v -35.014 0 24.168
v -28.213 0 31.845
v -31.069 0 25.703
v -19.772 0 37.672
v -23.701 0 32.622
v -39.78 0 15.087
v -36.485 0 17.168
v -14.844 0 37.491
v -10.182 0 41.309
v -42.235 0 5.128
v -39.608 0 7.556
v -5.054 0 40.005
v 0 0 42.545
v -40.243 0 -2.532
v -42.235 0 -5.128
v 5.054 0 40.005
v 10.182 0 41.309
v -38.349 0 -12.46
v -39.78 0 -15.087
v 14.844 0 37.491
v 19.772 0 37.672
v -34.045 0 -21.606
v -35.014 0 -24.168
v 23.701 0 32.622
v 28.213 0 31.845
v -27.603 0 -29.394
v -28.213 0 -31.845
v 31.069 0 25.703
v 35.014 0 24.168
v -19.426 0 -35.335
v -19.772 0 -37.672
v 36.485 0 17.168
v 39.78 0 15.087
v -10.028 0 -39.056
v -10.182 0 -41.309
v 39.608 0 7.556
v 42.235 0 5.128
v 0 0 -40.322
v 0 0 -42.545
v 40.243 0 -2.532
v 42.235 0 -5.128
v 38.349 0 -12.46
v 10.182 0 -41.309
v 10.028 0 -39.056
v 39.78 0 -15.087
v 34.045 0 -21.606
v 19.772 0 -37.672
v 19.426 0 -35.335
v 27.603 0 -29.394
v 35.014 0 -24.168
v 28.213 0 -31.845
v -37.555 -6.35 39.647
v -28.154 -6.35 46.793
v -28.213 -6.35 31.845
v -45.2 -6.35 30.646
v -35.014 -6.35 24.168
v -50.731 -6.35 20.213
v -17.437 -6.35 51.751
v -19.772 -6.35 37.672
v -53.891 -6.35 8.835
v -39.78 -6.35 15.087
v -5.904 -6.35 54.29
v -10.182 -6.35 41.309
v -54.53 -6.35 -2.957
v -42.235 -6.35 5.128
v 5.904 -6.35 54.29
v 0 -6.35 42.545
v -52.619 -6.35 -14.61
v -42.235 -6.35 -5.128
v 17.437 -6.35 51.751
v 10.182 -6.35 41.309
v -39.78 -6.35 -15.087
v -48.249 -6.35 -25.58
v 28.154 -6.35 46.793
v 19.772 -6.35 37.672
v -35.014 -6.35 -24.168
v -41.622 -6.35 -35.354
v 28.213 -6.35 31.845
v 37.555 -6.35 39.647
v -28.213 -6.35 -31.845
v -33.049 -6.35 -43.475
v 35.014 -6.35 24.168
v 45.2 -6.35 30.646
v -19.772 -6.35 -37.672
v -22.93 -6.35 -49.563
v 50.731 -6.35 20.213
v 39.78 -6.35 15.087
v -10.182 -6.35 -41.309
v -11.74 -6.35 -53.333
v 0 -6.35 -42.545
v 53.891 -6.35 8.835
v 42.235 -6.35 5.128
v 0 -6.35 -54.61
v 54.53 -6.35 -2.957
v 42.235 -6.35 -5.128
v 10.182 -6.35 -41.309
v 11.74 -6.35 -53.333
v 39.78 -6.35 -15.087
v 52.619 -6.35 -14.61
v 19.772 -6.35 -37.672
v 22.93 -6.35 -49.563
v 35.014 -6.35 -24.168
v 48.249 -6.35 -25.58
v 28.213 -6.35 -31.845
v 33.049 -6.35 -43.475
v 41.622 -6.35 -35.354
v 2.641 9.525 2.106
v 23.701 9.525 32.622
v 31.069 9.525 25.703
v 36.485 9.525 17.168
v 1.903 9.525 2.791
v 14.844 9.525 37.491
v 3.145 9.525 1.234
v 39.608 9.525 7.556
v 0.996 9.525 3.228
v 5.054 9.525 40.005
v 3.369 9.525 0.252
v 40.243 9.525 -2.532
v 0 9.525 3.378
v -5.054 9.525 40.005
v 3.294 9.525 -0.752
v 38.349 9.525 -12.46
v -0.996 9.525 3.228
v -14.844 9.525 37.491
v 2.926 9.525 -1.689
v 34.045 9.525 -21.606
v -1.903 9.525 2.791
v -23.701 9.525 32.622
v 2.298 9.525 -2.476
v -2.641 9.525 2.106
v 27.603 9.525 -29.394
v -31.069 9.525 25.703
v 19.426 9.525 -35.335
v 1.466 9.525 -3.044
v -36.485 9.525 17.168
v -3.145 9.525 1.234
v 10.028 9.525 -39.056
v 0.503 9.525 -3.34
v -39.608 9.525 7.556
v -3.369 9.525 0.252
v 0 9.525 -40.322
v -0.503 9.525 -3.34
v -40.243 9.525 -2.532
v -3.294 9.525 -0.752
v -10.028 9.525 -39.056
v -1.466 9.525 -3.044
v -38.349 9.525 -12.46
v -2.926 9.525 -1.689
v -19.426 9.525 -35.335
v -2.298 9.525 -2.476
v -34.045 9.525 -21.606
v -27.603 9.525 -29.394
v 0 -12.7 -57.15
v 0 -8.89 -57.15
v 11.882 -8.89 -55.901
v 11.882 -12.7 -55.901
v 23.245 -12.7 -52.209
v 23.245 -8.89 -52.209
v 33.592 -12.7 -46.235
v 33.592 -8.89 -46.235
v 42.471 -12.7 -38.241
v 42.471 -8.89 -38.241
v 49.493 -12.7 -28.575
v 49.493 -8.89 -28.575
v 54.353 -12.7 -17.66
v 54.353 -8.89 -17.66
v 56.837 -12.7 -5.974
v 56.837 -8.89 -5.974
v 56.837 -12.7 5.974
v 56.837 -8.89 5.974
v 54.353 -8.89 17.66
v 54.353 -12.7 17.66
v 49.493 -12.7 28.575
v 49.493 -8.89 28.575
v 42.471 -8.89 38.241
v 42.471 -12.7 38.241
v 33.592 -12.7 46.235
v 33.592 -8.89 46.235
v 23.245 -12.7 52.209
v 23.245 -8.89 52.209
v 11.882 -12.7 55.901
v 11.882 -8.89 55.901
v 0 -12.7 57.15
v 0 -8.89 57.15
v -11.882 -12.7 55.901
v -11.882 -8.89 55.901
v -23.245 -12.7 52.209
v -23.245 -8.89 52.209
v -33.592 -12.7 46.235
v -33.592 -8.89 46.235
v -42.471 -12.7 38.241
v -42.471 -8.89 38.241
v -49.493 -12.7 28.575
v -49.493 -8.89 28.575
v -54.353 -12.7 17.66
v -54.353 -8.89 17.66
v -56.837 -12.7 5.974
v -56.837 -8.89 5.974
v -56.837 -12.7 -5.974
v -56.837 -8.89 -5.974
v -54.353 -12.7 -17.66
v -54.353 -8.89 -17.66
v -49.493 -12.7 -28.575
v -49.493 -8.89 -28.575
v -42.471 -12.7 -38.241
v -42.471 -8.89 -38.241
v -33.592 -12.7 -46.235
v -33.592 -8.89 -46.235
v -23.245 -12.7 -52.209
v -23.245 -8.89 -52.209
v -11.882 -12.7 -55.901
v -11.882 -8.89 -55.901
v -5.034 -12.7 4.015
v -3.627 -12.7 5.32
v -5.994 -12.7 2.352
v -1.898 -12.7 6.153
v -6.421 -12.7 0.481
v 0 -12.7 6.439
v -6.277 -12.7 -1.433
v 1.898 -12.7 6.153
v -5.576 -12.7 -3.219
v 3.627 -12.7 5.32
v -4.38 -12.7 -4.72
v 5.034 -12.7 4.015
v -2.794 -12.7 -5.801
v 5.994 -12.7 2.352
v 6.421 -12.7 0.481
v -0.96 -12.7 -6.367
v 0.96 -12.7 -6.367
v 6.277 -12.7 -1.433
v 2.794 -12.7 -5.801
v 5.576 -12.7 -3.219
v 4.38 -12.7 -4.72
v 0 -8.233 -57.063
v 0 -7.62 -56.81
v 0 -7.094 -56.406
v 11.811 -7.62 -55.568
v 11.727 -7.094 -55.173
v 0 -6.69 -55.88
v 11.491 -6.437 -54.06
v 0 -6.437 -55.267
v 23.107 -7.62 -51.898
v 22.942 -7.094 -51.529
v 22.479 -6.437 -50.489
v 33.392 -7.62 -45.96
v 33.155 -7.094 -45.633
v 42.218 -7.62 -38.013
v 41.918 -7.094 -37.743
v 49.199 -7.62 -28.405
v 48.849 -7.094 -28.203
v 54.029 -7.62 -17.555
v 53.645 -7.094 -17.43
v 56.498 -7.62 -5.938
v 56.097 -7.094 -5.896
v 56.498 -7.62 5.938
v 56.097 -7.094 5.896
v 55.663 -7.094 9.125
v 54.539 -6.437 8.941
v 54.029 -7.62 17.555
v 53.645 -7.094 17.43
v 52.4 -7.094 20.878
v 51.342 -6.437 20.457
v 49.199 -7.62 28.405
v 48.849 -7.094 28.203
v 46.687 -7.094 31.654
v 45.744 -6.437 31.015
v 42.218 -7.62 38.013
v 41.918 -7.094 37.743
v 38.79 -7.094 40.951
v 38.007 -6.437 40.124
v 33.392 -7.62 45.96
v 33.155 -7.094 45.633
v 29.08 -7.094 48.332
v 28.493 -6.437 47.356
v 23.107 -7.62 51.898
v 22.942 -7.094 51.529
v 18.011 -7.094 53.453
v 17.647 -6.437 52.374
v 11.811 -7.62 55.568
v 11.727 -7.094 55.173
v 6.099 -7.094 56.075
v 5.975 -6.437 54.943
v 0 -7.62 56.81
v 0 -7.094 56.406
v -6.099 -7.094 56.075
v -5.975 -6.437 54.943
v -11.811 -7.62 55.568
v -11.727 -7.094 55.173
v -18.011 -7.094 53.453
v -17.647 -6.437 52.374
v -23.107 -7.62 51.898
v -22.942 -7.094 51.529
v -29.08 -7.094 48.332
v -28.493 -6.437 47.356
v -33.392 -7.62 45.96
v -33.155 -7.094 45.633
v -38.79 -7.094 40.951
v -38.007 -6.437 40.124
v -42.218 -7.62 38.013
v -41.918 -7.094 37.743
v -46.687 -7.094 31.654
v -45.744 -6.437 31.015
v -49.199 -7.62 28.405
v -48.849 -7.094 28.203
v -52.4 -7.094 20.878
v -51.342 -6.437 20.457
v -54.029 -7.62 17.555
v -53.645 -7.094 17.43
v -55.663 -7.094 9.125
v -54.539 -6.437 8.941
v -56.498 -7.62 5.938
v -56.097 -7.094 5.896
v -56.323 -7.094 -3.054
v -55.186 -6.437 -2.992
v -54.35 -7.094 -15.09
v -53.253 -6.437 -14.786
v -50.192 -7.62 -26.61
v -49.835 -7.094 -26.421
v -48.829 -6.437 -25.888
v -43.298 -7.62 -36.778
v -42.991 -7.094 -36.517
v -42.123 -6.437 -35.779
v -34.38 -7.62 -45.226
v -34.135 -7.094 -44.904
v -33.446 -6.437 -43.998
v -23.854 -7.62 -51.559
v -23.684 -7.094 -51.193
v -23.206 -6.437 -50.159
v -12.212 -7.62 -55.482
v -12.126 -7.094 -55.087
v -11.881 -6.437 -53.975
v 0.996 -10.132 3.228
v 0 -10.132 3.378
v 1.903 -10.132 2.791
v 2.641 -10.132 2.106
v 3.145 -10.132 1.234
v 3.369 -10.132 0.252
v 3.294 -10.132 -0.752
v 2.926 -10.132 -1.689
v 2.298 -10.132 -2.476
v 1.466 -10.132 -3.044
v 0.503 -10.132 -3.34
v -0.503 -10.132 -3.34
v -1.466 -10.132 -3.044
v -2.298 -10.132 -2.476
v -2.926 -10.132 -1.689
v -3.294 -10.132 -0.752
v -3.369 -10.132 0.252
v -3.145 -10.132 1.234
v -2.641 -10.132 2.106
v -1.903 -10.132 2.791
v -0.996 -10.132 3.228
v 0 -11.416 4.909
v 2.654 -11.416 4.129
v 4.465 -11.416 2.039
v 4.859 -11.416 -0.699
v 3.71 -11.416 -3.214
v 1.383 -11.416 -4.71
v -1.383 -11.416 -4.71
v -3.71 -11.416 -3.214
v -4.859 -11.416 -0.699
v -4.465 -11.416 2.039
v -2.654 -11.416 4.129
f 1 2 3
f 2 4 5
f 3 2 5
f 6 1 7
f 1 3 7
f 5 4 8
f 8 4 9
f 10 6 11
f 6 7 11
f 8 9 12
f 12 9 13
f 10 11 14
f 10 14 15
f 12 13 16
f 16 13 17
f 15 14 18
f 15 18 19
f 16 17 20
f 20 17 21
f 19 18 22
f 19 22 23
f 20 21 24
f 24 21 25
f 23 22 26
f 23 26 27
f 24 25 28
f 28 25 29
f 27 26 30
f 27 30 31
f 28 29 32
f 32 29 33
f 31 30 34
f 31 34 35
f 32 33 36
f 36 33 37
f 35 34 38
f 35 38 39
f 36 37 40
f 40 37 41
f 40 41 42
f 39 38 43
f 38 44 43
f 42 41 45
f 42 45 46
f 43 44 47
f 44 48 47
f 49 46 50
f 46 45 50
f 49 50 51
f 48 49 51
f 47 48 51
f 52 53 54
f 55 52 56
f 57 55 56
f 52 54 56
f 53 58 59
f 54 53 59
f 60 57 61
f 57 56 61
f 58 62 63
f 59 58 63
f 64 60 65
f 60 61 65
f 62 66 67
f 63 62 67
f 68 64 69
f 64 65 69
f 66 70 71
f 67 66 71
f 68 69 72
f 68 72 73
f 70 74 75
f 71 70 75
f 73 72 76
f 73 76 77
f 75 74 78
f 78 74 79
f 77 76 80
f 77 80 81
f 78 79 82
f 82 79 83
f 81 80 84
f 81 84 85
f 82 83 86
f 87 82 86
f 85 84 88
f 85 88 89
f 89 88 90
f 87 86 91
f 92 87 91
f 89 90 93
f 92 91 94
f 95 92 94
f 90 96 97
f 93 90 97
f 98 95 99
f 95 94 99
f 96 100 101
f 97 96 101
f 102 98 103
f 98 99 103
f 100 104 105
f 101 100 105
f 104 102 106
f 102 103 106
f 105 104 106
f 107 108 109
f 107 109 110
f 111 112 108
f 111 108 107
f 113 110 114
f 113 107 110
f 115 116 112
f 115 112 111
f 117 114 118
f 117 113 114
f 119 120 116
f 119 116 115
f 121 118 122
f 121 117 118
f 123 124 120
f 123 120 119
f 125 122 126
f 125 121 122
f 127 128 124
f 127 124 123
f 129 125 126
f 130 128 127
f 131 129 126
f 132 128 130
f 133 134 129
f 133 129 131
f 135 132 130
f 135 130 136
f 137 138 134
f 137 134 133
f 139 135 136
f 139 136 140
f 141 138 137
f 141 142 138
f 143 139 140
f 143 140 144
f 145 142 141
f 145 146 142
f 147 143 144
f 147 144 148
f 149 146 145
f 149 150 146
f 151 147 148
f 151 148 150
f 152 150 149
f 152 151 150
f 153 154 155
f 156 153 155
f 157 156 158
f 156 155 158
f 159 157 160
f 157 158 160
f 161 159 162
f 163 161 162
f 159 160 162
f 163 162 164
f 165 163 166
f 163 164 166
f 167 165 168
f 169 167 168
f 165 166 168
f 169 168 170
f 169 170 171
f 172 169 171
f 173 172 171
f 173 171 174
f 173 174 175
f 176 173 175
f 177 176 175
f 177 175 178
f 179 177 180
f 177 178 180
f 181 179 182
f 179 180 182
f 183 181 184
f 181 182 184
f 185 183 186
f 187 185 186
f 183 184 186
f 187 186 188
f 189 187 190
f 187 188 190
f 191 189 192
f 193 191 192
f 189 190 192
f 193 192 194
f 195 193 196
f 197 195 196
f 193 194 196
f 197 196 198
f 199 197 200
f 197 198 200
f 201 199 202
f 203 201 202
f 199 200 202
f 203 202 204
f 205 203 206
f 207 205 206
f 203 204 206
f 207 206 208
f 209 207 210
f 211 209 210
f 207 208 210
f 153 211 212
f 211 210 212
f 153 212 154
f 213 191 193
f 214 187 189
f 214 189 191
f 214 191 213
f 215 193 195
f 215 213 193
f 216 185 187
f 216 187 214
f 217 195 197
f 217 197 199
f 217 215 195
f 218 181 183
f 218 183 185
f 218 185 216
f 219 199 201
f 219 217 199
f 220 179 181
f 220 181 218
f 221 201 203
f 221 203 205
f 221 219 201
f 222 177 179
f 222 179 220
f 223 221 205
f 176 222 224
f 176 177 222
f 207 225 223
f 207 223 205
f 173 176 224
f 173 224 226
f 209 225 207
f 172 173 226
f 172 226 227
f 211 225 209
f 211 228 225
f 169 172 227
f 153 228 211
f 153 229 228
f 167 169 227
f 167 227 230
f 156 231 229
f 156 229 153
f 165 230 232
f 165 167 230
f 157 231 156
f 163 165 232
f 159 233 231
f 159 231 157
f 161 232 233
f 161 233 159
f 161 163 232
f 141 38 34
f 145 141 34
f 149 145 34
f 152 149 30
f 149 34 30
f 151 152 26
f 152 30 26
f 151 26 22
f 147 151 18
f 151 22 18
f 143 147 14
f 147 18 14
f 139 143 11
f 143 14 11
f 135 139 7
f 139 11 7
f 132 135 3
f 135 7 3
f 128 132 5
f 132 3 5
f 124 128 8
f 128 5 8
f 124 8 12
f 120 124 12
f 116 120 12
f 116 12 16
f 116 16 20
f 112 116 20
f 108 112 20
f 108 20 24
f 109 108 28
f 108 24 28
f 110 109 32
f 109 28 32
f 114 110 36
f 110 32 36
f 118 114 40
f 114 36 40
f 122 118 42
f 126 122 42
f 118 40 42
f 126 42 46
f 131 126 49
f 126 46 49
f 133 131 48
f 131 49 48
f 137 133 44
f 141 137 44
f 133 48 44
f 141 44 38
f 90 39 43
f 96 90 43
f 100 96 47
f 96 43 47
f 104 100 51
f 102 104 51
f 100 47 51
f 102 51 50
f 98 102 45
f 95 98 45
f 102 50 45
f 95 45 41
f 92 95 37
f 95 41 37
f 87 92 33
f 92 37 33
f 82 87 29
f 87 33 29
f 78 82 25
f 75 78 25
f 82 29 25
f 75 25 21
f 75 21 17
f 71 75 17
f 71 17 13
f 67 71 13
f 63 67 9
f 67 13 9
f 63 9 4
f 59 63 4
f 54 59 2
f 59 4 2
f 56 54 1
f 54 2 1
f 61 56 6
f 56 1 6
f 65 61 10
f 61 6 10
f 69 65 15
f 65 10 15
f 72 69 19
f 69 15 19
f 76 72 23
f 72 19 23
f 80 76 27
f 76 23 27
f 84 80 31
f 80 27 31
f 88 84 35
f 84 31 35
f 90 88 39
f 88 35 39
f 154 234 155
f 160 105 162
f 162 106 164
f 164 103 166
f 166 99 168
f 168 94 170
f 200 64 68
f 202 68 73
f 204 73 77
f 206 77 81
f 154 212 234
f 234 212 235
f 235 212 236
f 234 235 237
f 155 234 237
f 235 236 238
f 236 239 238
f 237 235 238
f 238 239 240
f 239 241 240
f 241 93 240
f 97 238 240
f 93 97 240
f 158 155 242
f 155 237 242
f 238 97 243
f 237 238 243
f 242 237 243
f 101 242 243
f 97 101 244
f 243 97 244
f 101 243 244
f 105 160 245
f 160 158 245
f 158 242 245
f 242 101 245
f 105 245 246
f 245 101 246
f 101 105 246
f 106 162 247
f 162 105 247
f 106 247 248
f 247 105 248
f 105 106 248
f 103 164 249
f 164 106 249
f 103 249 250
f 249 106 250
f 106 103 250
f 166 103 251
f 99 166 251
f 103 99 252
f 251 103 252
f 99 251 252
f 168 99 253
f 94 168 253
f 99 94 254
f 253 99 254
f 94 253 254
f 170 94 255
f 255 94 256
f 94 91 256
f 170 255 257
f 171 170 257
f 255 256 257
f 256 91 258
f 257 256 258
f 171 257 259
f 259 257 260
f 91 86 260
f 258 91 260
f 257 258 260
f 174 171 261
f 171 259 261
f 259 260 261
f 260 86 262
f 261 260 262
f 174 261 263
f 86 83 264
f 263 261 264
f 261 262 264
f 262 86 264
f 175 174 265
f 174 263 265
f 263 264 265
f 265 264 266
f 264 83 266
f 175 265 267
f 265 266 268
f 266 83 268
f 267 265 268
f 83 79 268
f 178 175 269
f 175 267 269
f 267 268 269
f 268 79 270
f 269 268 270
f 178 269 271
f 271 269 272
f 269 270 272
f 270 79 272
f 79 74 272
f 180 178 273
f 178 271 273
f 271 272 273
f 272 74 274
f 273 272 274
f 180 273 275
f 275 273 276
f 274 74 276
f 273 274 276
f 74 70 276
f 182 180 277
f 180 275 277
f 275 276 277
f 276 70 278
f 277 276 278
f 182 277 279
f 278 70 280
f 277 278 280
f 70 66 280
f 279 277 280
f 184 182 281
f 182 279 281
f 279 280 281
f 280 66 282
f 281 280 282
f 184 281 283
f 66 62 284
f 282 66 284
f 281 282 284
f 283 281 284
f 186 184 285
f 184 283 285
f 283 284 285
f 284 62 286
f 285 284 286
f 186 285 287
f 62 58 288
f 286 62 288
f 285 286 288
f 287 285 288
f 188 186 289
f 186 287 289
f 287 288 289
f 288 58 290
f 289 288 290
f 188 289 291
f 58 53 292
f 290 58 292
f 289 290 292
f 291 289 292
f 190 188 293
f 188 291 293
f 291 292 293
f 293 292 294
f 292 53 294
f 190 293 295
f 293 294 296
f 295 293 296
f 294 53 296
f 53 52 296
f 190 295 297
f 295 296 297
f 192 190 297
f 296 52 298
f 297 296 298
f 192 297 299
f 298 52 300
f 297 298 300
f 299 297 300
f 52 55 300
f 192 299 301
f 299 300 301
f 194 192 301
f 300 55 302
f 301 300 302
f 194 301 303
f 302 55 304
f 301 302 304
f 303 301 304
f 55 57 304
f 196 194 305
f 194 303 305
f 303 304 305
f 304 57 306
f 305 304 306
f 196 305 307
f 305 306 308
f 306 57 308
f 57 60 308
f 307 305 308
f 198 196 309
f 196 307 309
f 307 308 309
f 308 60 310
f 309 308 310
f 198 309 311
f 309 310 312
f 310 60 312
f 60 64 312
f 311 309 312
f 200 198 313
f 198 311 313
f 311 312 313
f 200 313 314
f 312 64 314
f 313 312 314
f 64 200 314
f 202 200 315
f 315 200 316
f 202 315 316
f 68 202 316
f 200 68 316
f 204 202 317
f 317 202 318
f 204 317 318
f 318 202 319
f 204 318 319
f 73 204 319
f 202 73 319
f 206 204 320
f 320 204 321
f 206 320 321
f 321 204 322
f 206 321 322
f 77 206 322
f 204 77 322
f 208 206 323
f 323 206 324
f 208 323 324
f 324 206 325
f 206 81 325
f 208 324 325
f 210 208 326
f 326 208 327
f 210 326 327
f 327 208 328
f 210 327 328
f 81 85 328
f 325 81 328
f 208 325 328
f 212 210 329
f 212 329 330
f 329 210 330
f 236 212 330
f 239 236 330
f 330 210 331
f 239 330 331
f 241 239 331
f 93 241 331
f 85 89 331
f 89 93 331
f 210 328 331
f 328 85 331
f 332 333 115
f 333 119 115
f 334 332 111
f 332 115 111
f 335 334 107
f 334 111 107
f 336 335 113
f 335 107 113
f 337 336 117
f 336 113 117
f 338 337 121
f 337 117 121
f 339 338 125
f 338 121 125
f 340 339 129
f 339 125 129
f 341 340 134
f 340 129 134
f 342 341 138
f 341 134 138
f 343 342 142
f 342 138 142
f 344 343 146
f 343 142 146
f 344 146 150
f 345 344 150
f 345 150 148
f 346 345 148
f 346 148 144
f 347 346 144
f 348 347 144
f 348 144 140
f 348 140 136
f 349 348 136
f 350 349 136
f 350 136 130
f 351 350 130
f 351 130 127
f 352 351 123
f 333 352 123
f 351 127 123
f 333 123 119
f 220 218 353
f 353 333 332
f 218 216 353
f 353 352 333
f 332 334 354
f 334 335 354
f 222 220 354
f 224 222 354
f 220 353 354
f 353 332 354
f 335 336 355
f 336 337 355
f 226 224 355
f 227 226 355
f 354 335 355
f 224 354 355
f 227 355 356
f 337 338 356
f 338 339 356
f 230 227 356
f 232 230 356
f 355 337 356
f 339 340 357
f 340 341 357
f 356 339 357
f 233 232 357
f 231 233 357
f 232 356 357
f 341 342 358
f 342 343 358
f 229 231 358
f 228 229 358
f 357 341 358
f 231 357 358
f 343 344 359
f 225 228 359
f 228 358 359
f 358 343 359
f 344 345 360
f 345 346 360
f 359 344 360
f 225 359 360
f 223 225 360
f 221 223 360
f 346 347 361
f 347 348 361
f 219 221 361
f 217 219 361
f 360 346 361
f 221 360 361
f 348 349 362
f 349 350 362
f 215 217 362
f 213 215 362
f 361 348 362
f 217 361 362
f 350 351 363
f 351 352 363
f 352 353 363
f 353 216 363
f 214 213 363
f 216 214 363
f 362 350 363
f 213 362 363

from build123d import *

# Parameters (mm, degrees)
SKETCH1_R                                           = 40.3225
BOSS_EXTRUDE1_DEPTH                                 = 9.525
SKETCH2_R                                           = 42.545
BOSS_EXTRUDE2_DEPTH                                 = 6.35
SKETCH3_R                                           = 57.15
BOSS_EXTRUDE3_DEPTH                                 = 6.35
FILLET2_R                                           = 2.54
CSK_FOR_1_4_FLAT_HEAD_MACHINE_SCREW_100_D           = 6.7564
CSK_FOR_1_4_FLAT_HEAD_MACHINE_SCREW_100_CSINK_D     = 12.8778
CSK_FOR_1_4_FLAT_HEAD_MACHINE_SCREW_100_CSINK_ANGLE = 100


with BuildPart() as part:
    # Sketch1 → Boss-Extrude1 (new body)
    with BuildSketch(Plane(origin=(0, 0, 0), x_dir=(1, 0, 0), z_dir=(0, 1, 0))):
        with Locations(Location((0, 0, 0), (0, 0, 90))):
            Circle(SKETCH1_R)
    extrude(amount=BOSS_EXTRUDE1_DEPTH)

    # Sketch2 → Boss-Extrude2 (add)
    with BuildSketch(Plane.XZ):
        with Locations(Location((0, 0, 0), (0, 0, 270))):
            Circle(SKETCH2_R)
    extrude(amount=BOSS_EXTRUDE2_DEPTH)

    # Sketch3 → Boss-Extrude3 (add)
    with BuildSketch(Plane.XZ.offset(6.35)):
        with Locations(Location((0, 0, 0), (0, 0, 270))):
            Circle(SKETCH3_R)
    extrude(amount=BOSS_EXTRUDE3_DEPTH)

    # Fillet2
    fillet2_edges = [part.edges().sort_by_distance(p)[0] for p in [
        (0, -6.35, 57.15),
    ]]
    fillet(fillet2_edges, radius=FILLET2_R)

    # CSK for 1/4 Flat Head Machine Screw (100)1 (through all)
    with Locations(Plane(origin=(0, -12.7, 0), x_dir=(0, 0, -1), z_dir=(0, -1, 0))):
        with Locations((0, 0)):
            CounterSinkHole(CSK_FOR_1_4_FLAT_HEAD_MACHINE_SCREW_100_D / 2, CSK_FOR_1_4_FLAT_HEAD_MACHINE_SCREW_100_CSINK_D / 2, counter_sink_angle=CSK_FOR_1_4_FLAT_HEAD_MACHINE_SCREW_100_CSINK_ANGLE)


solid = part.part
